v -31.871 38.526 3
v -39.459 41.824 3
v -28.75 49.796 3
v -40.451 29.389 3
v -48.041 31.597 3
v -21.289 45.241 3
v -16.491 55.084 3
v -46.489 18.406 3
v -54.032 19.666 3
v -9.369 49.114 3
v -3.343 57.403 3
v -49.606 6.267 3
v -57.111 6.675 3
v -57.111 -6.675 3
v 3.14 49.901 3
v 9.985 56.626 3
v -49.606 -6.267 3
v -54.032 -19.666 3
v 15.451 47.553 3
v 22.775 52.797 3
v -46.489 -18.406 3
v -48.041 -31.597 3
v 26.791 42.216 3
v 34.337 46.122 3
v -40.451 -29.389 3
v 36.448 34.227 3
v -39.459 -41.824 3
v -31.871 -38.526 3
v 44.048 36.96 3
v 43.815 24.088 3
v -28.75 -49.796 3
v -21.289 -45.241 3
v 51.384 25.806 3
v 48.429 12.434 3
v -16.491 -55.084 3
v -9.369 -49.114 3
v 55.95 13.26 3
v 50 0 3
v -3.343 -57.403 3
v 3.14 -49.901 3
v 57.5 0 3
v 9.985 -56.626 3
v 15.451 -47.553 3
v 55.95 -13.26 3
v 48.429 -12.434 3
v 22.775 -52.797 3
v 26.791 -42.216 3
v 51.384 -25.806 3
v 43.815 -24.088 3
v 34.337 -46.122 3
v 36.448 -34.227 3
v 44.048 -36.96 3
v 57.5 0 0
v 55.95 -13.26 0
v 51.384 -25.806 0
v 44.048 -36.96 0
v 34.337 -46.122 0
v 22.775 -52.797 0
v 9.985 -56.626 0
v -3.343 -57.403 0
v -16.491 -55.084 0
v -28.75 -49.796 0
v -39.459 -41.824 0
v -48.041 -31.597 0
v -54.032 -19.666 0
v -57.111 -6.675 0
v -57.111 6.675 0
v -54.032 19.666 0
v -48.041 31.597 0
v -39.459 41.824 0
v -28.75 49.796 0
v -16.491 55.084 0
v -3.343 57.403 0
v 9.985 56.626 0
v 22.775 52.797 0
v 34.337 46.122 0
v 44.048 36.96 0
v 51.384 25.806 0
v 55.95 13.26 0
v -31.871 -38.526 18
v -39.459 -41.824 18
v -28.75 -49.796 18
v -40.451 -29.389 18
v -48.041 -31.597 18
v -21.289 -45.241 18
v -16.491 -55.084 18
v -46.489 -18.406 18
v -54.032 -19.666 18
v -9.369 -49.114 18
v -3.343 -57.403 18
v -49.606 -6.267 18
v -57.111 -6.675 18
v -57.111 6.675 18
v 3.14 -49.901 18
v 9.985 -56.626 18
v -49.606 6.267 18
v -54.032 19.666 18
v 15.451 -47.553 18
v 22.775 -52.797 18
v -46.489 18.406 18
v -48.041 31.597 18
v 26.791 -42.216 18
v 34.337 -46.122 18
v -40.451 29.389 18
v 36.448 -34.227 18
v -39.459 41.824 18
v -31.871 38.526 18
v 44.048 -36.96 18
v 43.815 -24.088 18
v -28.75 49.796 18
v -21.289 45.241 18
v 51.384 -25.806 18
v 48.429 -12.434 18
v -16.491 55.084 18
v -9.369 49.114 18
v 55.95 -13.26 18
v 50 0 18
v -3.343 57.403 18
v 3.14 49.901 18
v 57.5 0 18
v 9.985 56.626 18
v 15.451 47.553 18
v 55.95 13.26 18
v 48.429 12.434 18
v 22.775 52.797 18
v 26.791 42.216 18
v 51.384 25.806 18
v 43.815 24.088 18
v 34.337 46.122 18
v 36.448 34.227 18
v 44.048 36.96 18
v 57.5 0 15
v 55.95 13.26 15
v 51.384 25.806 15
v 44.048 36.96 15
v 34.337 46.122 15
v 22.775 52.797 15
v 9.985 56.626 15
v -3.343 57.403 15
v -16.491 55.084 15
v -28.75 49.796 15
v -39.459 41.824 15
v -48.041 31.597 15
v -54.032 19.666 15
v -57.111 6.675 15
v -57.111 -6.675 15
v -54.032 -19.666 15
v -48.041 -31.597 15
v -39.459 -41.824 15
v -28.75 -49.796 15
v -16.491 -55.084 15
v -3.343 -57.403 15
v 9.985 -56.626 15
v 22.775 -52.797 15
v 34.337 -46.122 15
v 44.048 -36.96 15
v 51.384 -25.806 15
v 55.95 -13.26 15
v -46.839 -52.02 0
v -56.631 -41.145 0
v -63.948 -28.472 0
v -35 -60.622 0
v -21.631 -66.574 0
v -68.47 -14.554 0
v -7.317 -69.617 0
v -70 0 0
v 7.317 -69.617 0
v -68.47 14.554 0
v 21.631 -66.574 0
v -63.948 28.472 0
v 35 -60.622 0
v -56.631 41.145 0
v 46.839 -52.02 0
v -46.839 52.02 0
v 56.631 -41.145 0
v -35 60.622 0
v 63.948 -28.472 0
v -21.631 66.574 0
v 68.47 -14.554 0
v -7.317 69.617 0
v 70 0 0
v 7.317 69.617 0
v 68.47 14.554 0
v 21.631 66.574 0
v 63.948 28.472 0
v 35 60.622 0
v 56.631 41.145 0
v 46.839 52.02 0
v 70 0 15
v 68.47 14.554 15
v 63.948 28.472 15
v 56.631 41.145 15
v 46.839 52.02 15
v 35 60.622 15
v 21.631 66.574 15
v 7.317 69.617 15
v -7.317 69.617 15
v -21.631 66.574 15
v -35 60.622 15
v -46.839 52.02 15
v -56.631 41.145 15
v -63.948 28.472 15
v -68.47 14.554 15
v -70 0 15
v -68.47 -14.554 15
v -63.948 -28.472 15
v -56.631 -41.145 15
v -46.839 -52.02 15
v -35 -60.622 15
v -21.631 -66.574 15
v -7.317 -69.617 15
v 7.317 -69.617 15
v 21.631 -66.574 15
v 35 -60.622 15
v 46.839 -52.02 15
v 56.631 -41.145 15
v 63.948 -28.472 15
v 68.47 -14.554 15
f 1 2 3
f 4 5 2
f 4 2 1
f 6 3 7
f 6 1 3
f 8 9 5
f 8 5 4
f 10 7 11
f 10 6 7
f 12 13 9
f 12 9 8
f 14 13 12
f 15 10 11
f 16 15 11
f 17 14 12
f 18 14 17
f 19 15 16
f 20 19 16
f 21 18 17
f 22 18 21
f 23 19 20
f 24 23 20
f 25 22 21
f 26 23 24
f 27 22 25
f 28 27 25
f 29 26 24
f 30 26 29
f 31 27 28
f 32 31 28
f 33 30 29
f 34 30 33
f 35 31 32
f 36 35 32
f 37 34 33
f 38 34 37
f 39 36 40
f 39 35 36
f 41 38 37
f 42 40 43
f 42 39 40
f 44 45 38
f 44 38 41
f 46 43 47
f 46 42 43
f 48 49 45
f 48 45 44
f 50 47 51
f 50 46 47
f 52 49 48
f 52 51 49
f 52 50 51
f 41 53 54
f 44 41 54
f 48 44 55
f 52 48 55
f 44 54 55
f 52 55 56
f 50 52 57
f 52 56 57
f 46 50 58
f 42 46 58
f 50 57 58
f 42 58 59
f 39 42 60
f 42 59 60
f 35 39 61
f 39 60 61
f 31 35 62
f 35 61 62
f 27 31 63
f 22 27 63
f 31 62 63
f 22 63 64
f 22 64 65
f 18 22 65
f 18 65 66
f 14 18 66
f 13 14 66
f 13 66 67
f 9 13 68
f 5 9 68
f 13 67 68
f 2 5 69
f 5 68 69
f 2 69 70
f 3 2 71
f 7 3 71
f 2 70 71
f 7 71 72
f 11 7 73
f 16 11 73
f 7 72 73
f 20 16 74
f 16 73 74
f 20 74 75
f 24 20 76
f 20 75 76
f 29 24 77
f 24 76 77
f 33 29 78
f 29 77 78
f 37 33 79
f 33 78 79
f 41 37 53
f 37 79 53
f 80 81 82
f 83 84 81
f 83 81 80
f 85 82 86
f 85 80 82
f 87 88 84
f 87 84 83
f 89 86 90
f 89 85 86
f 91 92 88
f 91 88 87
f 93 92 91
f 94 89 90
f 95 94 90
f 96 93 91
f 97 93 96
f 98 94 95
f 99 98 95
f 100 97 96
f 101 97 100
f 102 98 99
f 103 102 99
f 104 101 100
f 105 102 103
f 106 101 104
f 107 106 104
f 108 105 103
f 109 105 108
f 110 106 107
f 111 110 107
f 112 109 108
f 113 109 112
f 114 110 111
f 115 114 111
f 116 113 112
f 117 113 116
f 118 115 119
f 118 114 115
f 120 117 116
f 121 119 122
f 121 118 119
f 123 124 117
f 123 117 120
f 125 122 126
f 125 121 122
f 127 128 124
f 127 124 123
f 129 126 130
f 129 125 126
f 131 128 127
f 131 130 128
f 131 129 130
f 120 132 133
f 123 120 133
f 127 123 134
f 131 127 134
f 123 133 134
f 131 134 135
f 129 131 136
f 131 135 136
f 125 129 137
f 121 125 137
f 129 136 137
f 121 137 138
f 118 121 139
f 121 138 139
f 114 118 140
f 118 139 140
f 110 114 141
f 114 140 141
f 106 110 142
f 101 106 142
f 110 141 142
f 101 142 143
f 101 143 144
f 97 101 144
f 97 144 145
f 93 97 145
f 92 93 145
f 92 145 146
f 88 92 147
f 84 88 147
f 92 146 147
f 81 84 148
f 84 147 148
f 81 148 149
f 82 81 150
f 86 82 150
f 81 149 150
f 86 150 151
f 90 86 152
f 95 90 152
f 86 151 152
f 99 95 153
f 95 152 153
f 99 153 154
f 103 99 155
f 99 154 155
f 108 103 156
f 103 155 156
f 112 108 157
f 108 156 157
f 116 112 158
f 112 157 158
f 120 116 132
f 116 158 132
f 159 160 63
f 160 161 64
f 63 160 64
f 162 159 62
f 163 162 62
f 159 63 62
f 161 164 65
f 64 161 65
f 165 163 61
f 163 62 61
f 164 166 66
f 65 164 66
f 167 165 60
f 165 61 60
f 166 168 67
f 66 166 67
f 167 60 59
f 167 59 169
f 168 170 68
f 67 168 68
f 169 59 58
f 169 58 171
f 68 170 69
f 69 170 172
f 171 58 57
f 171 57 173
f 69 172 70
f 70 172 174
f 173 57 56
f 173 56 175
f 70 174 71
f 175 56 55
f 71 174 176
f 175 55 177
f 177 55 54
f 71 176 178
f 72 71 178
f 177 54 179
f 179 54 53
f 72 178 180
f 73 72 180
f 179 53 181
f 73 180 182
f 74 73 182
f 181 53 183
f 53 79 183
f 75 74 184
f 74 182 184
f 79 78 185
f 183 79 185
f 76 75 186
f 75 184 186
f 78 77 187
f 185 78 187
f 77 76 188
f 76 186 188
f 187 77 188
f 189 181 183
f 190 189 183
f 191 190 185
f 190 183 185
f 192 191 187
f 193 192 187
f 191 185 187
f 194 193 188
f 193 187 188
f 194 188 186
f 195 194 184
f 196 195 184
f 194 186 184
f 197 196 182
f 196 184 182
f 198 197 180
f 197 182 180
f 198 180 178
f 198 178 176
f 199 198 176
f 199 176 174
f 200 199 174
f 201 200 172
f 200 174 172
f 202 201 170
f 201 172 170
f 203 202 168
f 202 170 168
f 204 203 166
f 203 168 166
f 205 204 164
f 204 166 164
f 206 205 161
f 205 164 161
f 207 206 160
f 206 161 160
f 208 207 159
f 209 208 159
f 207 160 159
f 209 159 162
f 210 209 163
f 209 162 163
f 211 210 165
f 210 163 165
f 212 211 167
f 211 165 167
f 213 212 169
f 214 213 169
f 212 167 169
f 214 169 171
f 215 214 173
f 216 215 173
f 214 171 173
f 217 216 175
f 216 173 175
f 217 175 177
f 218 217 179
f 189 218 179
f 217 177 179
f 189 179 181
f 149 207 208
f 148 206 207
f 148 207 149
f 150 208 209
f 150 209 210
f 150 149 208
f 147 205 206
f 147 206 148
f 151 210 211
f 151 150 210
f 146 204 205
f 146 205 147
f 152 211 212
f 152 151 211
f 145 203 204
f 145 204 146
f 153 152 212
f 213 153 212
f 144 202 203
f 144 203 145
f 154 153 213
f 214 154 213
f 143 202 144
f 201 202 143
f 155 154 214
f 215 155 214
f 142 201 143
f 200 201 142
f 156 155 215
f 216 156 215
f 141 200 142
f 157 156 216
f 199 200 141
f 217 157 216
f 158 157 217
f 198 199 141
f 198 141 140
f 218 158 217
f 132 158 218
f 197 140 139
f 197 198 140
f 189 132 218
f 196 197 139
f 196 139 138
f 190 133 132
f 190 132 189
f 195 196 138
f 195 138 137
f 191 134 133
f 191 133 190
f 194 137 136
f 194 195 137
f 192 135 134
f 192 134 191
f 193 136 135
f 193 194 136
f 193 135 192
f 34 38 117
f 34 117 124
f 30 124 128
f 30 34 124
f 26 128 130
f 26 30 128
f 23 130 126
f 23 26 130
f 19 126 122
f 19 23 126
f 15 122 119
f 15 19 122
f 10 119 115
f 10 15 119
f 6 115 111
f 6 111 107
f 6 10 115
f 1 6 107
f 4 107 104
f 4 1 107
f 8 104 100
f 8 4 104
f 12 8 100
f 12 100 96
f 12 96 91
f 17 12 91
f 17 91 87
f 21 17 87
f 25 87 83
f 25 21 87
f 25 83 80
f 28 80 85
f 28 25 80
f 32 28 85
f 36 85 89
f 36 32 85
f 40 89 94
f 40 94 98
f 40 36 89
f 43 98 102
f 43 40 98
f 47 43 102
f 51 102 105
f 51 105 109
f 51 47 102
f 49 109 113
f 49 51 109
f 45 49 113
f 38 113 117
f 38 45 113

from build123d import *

# Parameters (mm, degrees)
F0_R     = 70
F0_R_2   = 50
F1_DEPTH = 15
F3_R     = 57.5
F3_R_2   = 50
F4_DEPTH = 3
F5_R     = 57.5
F5_R_2   = 50
F6_DEPTH = 3


with BuildPart() as f1:
    # F0 (on Top) → F1 (new body)
    with BuildSketch(Plane.XY):
        Circle(F0_R)
        Circle(F0_R_2, mode=Mode.SUBTRACT)
    extrude(amount=F1_DEPTH)

    # F3 (on face) → F4 (join)
    with BuildSketch(Plane.XY.offset(15)):
        Circle(F3_R)
        Circle(F3_R_2, mode=Mode.SUBTRACT)
    extrude(amount=F4_DEPTH)

    # F5 (on face) → F6 (cut)
    with BuildSketch(Plane(origin=(0, 0, 0), x_dir=(1, 0, 0), z_dir=(0, 0, -1))):
        Circle(F5_R)
        Circle(F5_R_2, mode=Mode.SUBTRACT)
    extrude(amount=-F6_DEPTH, mode=Mode.SUBTRACT)


solid = f1.part
